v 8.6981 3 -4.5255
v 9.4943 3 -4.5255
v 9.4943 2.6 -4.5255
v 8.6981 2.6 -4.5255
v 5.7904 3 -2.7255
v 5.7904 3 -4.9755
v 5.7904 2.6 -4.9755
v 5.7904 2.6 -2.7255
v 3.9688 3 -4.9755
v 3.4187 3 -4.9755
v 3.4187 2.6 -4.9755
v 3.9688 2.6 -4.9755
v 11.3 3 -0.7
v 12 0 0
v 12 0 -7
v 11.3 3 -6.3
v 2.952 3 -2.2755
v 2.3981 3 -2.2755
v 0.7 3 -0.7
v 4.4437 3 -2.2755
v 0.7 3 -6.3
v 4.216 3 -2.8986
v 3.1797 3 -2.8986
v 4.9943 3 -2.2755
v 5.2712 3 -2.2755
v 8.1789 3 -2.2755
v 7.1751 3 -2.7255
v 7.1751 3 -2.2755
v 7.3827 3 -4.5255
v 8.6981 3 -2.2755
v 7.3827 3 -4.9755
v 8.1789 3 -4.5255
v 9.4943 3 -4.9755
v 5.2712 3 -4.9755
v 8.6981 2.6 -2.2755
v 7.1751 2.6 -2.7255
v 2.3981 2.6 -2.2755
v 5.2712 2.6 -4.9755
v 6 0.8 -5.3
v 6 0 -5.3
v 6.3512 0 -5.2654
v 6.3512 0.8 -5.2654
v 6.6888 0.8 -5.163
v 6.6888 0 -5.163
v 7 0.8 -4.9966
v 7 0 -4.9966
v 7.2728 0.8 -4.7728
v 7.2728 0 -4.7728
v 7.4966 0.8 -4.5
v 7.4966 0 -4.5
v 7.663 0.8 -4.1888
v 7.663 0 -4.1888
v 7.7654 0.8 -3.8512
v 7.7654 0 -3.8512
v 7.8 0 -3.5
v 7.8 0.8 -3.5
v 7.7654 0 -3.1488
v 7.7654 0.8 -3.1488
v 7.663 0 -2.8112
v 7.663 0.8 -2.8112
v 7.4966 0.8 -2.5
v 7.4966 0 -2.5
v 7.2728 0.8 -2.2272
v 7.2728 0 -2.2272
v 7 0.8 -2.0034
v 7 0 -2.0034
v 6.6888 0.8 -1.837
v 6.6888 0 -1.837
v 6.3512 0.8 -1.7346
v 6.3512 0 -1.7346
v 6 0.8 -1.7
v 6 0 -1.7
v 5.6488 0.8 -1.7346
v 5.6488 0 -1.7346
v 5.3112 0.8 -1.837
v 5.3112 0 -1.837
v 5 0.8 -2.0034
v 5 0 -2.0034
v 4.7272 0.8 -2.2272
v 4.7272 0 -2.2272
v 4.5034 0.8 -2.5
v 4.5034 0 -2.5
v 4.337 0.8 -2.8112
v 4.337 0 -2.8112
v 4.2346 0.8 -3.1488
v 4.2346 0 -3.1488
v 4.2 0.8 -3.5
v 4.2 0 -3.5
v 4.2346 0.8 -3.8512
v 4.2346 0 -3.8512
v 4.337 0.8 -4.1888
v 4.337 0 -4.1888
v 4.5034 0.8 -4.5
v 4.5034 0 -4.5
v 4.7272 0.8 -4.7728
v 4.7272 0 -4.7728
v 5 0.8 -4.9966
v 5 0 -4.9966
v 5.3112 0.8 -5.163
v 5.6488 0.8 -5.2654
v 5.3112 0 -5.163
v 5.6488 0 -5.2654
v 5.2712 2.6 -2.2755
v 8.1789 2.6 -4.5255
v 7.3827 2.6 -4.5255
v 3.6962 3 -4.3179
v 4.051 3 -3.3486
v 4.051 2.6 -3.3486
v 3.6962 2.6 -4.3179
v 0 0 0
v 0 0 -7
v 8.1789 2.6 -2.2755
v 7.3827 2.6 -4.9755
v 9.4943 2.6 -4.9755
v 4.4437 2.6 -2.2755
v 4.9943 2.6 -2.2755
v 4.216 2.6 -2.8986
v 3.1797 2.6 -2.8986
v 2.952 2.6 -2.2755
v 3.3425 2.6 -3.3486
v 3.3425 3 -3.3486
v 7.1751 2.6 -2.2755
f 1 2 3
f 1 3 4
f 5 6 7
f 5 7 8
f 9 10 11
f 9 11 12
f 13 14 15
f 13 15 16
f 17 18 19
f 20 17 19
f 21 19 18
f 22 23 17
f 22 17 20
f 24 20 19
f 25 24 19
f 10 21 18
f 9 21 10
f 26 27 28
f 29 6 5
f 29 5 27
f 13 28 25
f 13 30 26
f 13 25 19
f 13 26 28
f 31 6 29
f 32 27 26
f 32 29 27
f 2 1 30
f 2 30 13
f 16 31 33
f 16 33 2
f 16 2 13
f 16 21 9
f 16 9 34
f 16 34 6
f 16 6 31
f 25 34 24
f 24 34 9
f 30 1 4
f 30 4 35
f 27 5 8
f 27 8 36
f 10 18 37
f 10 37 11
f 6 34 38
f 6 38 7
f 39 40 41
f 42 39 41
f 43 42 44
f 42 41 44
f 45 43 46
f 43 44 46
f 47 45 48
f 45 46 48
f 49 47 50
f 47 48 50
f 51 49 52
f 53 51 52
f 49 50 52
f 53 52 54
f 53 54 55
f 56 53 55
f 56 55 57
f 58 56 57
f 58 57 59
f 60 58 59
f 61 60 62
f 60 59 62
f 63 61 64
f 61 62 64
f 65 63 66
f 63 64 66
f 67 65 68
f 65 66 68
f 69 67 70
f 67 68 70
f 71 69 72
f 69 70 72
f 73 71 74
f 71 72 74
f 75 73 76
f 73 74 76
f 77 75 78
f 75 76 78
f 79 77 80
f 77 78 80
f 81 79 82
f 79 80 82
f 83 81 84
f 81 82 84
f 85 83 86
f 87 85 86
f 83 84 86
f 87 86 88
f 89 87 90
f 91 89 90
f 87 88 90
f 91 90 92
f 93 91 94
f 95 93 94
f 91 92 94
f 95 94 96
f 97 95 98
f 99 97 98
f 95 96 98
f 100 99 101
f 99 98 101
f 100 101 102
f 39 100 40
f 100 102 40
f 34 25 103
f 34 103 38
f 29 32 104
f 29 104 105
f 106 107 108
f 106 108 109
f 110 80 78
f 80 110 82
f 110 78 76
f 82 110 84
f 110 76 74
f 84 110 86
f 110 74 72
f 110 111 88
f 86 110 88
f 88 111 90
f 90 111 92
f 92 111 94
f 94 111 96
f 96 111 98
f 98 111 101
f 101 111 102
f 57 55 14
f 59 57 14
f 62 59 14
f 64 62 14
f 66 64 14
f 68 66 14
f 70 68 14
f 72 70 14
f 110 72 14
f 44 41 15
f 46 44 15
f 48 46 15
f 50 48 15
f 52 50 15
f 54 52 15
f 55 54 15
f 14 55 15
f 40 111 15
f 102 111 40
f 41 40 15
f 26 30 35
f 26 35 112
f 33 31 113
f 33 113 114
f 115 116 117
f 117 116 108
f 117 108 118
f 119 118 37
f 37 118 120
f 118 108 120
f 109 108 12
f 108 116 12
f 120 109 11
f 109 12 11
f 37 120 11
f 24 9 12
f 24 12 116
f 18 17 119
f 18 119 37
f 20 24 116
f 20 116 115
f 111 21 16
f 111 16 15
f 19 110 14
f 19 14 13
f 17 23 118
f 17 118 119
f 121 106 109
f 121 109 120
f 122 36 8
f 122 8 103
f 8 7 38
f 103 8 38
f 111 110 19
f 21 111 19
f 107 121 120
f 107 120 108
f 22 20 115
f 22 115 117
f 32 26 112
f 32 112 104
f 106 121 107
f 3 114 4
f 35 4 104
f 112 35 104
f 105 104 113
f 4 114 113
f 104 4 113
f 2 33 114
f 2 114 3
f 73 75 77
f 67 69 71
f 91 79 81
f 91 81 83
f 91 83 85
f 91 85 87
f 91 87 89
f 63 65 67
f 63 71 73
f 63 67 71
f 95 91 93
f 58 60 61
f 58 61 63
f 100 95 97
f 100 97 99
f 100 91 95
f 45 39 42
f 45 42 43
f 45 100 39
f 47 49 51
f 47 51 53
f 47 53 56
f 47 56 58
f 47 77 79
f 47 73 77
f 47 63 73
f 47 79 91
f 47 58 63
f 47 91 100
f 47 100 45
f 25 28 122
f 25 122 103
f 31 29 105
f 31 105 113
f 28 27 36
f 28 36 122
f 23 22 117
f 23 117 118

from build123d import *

# Parameters (mm, degrees)
SKETCH1_W               = 12
SKETCH1_H               = 7
BOSS_EXTRUDE1_DEPTH     = 3
CUT_EXTRUDE1_DEPTH      = 7
CUT_EXTRUDE2_DEPTH      = 15.212670404
CUT_EXTRUDE2_DEPTH_BACK = 15.212670404
SKETCH4_R               = 1.8
CUT_EXTRUDE3_DEPTH      = 0.8
CUT_EXTRUDE4_DEPTH      = 0.4


with BuildPart() as part:
    # Sketch1 → Boss-Extrude1 (new body)
    with BuildSketch(Plane(origin=(0, 0, 0), x_dir=(1, 0, 0), z_dir=(0, 1, 0))):
        with Locations((6, 3.5)):
            Rectangle(SKETCH1_W, SKETCH1_H)
    extrude(amount=BOSS_EXTRUDE1_DEPTH)

    # Sketch2 → Cut-Extrude1 (cut)
    with BuildSketch(Plane.XY):
        Polygon((0, 0), (0.7, 3), (0, 3), align=None)
        Polygon((12, 0), (11.3, 3), (12, 3), align=None)
    extrude(amount=-CUT_EXTRUDE1_DEPTH, mode=Mode.SUBTRACT)

    # Sketch3 → Cut-Extrude2 (cut, two sides: drawn at the far end of the back side and taken through both)
    with BuildSketch(Plane(origin=(0, 0, 0), x_dir=(0, 0, -1), z_dir=(1, 0, 0)).offset(-CUT_EXTRUDE2_DEPTH_BACK)):
        Polygon((0, 0), (0.7, 3), (0, 3), align=None)
        Polygon((7, 3), (6.3, 3), (7, 0), align=None)
    extrude(amount=CUT_EXTRUDE2_DEPTH + CUT_EXTRUDE2_DEPTH_BACK, mode=Mode.SUBTRACT)

    # Sketch4 → Cut-Extrude3 (cut)
    with BuildSketch(Plane.XZ):
        with Locations(Location((6, -3.5, 0), (0, 0, 270))):
            Circle(SKETCH4_R)
    extrude(amount=-CUT_EXTRUDE3_DEPTH, mode=Mode.SUBTRACT)

    # Sketch5 → Cut-Extrude4 (cut)
    # profile 1 of 3: a face of its own
    with BuildSketch(Plane(origin=(0, 3, 0), x_dir=(1, 0, 0), z_dir=(0, 1, 0))):
        Polygon((4.994280794, 2.275548034), (4.443679833, 2.275548034), (4.215975506, 2.898624958), (3.179677429, 2.898624958), (2.951973102, 2.275548034), (2.398126948, 2.275548034), (3.418739929, 4.975548034), (3.968800025, 4.975548034), align=None)
        Polygon((4.051011564, 3.348624958), (3.696203871, 4.317855727), (3.34247791, 3.348624958), align=None, mode=Mode.SUBTRACT)
    # profile 2 of 3: a face of its own
    with BuildSketch(Plane(origin=(0, 3, 0), x_dir=(1, 0, 0), z_dir=(0, 1, 0))):
        Polygon((5.271203871, 2.275548034), (5.271203871, 4.975548034), (5.79043464, 4.975548034), (5.79043464, 2.725548034), (7.175050025, 2.725548034), (7.175050025, 2.275548034), align=None)
    # profile 3 of 3: a face of its own
    with BuildSketch(Plane(origin=(0, 3, 0), x_dir=(1, 0, 0), z_dir=(0, 1, 0))):
        Polygon((8.178896179, 2.275548034), (8.178896179, 4.525548034), (7.382742333, 4.525548034), (7.382742333, 4.975548034), (9.494280794, 4.975548034), (9.494280794, 4.525548034), (8.698126948, 4.525548034), (8.698126948, 2.275548034), align=None)
    extrude(amount=-CUT_EXTRUDE4_DEPTH, mode=Mode.SUBTRACT)


solid = part.part
